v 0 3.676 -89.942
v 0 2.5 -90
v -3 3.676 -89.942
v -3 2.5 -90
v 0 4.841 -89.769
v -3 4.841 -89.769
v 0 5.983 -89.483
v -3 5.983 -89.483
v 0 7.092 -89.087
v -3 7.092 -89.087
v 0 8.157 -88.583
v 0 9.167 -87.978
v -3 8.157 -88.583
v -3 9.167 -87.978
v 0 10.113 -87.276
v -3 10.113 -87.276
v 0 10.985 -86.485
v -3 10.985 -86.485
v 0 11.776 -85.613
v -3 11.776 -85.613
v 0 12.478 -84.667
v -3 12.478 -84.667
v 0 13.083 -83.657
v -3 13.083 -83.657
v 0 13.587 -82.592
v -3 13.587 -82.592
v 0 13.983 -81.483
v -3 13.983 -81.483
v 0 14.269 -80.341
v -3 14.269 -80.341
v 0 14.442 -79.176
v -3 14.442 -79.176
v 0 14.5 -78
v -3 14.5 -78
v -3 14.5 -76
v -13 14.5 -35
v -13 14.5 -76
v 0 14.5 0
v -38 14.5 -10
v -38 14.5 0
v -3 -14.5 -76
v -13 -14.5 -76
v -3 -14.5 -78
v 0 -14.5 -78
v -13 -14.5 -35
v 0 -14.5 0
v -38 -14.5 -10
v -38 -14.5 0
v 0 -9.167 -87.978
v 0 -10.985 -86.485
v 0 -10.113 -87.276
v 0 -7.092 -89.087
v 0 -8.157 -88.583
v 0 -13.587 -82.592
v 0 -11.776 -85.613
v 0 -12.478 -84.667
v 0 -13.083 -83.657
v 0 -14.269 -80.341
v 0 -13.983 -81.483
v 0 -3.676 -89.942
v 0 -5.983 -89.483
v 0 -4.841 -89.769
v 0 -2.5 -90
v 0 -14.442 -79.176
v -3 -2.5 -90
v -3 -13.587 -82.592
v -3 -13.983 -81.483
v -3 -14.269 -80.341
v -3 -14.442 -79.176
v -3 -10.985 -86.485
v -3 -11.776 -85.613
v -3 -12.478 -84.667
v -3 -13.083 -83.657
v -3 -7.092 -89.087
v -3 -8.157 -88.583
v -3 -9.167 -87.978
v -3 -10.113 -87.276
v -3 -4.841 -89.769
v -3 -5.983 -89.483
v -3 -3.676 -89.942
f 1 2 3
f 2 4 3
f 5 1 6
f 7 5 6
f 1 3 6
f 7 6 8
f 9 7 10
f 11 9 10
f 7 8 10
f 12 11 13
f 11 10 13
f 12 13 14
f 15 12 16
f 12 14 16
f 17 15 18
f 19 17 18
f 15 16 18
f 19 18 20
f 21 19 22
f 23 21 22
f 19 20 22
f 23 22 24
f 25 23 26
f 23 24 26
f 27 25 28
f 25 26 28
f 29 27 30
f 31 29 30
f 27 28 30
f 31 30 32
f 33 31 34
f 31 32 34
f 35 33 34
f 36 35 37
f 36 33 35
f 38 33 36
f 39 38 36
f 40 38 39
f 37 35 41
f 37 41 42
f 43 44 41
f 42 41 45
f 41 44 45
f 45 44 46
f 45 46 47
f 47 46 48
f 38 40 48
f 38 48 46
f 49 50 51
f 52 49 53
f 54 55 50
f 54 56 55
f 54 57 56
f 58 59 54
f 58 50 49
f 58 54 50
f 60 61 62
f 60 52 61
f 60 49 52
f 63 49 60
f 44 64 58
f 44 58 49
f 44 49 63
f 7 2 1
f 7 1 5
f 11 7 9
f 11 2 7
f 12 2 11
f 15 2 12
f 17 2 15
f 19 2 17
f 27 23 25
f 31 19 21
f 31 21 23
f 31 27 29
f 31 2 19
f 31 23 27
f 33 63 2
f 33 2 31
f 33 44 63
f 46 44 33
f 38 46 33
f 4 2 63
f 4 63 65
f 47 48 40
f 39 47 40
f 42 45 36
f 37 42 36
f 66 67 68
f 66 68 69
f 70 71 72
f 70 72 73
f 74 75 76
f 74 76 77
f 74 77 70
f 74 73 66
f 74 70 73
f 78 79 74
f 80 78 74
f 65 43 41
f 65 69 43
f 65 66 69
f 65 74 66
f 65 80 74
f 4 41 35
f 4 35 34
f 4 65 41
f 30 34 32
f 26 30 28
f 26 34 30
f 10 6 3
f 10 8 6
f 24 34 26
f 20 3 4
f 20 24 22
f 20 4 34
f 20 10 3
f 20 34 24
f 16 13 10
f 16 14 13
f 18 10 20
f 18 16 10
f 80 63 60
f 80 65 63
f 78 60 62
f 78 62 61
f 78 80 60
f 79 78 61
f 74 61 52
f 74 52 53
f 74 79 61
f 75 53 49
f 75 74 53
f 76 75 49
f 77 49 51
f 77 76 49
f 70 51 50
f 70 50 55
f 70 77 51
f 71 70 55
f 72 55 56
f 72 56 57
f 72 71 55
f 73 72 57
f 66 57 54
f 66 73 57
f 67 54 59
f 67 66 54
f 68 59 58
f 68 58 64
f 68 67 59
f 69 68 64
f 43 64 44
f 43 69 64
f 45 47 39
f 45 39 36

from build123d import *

# Parameters (mm, degrees)
SKETCH1_W           = 38
SKETCH1_H           = 29
BOSS_EXTRUDE1_DEPTH = 50
SKETCH2_W           = 13
SKETCH2_H           = 29
BOSS_EXTRUDE2_DEPTH = 40
CHAMFER1_SIZE       = 40
SKETCH3_W           = 10
SKETCH3_H           = 29
CUT_EXTRUDE1_DEPTH  = 14
FILLET1_R           = 12


with BuildPart() as part:
    # Sketch1 → Boss-Extrude1 (new body)
    with BuildSketch(Plane.XY):
        with Locations((-19, 0)):
            Rectangle(SKETCH1_W, SKETCH1_H)
    extrude(amount=-BOSS_EXTRUDE1_DEPTH)

    # Sketch2 → Boss-Extrude2 (add)
    with BuildSketch(Plane(origin=(0, 0, -50), x_dir=(-1, 0, 0), z_dir=(0, 0, -1))):
        with Locations((6.5, 0)):
            Rectangle(SKETCH2_W, SKETCH2_H)
    extrude(amount=BOSS_EXTRUDE2_DEPTH)

    # Chamfer1
    # the kernel refuses this chamfer: 40 mm, written as the material it takes off along each edge
    with BuildSketch(Plane(origin=(-38, -117.367319519, -50), x_dir=(-0.027495876610586317, 0, 0.9996219169112968), z_dir=(0, 1, 0))) as chamfer1_piece_1_section:
        Polygon((CHAMFER1_SIZE * 0.999621916911, CHAMFER1_SIZE * 0.0274958766106), (-CHAMFER1_SIZE * 0.0274958766106, CHAMFER1_SIZE * 0.999621916911), (0, 0), align=None)
    chamfer1_piece_1 = extrude(amount=234.734639037, mode=Mode.PRIVATE)
    chamfer1_piece_1 = split(chamfer1_piece_1, bisect_by=Plane(origin=(-13, 0, -35.169417803), z_dir=(-1, 0, 0)), keep=Keep.TOP, mode=Mode.PRIVATE)
    add(chamfer1_piece_1, mode=Mode.SUBTRACT)

    # Sketch3 → Cut-Extrude1 (cut)
    with BuildSketch(Plane(origin=(0, 0, -90), x_dir=(-1, 0, 0), z_dir=(0, 0, -1))):
        with Locations((8, 0)):
            Rectangle(SKETCH3_W, SKETCH3_H)
    extrude(amount=-CUT_EXTRUDE1_DEPTH, mode=Mode.SUBTRACT)

    # Fillet1
    fillet1_edges = [part.edges().sort_by_distance(p)[0] for p in [
        (-1.5, -14.5, -90),
        (-1.5, 14.5, -90),
    ]]
    fillet(fillet1_edges, radius=FILLET1_R)


solid = part.part
